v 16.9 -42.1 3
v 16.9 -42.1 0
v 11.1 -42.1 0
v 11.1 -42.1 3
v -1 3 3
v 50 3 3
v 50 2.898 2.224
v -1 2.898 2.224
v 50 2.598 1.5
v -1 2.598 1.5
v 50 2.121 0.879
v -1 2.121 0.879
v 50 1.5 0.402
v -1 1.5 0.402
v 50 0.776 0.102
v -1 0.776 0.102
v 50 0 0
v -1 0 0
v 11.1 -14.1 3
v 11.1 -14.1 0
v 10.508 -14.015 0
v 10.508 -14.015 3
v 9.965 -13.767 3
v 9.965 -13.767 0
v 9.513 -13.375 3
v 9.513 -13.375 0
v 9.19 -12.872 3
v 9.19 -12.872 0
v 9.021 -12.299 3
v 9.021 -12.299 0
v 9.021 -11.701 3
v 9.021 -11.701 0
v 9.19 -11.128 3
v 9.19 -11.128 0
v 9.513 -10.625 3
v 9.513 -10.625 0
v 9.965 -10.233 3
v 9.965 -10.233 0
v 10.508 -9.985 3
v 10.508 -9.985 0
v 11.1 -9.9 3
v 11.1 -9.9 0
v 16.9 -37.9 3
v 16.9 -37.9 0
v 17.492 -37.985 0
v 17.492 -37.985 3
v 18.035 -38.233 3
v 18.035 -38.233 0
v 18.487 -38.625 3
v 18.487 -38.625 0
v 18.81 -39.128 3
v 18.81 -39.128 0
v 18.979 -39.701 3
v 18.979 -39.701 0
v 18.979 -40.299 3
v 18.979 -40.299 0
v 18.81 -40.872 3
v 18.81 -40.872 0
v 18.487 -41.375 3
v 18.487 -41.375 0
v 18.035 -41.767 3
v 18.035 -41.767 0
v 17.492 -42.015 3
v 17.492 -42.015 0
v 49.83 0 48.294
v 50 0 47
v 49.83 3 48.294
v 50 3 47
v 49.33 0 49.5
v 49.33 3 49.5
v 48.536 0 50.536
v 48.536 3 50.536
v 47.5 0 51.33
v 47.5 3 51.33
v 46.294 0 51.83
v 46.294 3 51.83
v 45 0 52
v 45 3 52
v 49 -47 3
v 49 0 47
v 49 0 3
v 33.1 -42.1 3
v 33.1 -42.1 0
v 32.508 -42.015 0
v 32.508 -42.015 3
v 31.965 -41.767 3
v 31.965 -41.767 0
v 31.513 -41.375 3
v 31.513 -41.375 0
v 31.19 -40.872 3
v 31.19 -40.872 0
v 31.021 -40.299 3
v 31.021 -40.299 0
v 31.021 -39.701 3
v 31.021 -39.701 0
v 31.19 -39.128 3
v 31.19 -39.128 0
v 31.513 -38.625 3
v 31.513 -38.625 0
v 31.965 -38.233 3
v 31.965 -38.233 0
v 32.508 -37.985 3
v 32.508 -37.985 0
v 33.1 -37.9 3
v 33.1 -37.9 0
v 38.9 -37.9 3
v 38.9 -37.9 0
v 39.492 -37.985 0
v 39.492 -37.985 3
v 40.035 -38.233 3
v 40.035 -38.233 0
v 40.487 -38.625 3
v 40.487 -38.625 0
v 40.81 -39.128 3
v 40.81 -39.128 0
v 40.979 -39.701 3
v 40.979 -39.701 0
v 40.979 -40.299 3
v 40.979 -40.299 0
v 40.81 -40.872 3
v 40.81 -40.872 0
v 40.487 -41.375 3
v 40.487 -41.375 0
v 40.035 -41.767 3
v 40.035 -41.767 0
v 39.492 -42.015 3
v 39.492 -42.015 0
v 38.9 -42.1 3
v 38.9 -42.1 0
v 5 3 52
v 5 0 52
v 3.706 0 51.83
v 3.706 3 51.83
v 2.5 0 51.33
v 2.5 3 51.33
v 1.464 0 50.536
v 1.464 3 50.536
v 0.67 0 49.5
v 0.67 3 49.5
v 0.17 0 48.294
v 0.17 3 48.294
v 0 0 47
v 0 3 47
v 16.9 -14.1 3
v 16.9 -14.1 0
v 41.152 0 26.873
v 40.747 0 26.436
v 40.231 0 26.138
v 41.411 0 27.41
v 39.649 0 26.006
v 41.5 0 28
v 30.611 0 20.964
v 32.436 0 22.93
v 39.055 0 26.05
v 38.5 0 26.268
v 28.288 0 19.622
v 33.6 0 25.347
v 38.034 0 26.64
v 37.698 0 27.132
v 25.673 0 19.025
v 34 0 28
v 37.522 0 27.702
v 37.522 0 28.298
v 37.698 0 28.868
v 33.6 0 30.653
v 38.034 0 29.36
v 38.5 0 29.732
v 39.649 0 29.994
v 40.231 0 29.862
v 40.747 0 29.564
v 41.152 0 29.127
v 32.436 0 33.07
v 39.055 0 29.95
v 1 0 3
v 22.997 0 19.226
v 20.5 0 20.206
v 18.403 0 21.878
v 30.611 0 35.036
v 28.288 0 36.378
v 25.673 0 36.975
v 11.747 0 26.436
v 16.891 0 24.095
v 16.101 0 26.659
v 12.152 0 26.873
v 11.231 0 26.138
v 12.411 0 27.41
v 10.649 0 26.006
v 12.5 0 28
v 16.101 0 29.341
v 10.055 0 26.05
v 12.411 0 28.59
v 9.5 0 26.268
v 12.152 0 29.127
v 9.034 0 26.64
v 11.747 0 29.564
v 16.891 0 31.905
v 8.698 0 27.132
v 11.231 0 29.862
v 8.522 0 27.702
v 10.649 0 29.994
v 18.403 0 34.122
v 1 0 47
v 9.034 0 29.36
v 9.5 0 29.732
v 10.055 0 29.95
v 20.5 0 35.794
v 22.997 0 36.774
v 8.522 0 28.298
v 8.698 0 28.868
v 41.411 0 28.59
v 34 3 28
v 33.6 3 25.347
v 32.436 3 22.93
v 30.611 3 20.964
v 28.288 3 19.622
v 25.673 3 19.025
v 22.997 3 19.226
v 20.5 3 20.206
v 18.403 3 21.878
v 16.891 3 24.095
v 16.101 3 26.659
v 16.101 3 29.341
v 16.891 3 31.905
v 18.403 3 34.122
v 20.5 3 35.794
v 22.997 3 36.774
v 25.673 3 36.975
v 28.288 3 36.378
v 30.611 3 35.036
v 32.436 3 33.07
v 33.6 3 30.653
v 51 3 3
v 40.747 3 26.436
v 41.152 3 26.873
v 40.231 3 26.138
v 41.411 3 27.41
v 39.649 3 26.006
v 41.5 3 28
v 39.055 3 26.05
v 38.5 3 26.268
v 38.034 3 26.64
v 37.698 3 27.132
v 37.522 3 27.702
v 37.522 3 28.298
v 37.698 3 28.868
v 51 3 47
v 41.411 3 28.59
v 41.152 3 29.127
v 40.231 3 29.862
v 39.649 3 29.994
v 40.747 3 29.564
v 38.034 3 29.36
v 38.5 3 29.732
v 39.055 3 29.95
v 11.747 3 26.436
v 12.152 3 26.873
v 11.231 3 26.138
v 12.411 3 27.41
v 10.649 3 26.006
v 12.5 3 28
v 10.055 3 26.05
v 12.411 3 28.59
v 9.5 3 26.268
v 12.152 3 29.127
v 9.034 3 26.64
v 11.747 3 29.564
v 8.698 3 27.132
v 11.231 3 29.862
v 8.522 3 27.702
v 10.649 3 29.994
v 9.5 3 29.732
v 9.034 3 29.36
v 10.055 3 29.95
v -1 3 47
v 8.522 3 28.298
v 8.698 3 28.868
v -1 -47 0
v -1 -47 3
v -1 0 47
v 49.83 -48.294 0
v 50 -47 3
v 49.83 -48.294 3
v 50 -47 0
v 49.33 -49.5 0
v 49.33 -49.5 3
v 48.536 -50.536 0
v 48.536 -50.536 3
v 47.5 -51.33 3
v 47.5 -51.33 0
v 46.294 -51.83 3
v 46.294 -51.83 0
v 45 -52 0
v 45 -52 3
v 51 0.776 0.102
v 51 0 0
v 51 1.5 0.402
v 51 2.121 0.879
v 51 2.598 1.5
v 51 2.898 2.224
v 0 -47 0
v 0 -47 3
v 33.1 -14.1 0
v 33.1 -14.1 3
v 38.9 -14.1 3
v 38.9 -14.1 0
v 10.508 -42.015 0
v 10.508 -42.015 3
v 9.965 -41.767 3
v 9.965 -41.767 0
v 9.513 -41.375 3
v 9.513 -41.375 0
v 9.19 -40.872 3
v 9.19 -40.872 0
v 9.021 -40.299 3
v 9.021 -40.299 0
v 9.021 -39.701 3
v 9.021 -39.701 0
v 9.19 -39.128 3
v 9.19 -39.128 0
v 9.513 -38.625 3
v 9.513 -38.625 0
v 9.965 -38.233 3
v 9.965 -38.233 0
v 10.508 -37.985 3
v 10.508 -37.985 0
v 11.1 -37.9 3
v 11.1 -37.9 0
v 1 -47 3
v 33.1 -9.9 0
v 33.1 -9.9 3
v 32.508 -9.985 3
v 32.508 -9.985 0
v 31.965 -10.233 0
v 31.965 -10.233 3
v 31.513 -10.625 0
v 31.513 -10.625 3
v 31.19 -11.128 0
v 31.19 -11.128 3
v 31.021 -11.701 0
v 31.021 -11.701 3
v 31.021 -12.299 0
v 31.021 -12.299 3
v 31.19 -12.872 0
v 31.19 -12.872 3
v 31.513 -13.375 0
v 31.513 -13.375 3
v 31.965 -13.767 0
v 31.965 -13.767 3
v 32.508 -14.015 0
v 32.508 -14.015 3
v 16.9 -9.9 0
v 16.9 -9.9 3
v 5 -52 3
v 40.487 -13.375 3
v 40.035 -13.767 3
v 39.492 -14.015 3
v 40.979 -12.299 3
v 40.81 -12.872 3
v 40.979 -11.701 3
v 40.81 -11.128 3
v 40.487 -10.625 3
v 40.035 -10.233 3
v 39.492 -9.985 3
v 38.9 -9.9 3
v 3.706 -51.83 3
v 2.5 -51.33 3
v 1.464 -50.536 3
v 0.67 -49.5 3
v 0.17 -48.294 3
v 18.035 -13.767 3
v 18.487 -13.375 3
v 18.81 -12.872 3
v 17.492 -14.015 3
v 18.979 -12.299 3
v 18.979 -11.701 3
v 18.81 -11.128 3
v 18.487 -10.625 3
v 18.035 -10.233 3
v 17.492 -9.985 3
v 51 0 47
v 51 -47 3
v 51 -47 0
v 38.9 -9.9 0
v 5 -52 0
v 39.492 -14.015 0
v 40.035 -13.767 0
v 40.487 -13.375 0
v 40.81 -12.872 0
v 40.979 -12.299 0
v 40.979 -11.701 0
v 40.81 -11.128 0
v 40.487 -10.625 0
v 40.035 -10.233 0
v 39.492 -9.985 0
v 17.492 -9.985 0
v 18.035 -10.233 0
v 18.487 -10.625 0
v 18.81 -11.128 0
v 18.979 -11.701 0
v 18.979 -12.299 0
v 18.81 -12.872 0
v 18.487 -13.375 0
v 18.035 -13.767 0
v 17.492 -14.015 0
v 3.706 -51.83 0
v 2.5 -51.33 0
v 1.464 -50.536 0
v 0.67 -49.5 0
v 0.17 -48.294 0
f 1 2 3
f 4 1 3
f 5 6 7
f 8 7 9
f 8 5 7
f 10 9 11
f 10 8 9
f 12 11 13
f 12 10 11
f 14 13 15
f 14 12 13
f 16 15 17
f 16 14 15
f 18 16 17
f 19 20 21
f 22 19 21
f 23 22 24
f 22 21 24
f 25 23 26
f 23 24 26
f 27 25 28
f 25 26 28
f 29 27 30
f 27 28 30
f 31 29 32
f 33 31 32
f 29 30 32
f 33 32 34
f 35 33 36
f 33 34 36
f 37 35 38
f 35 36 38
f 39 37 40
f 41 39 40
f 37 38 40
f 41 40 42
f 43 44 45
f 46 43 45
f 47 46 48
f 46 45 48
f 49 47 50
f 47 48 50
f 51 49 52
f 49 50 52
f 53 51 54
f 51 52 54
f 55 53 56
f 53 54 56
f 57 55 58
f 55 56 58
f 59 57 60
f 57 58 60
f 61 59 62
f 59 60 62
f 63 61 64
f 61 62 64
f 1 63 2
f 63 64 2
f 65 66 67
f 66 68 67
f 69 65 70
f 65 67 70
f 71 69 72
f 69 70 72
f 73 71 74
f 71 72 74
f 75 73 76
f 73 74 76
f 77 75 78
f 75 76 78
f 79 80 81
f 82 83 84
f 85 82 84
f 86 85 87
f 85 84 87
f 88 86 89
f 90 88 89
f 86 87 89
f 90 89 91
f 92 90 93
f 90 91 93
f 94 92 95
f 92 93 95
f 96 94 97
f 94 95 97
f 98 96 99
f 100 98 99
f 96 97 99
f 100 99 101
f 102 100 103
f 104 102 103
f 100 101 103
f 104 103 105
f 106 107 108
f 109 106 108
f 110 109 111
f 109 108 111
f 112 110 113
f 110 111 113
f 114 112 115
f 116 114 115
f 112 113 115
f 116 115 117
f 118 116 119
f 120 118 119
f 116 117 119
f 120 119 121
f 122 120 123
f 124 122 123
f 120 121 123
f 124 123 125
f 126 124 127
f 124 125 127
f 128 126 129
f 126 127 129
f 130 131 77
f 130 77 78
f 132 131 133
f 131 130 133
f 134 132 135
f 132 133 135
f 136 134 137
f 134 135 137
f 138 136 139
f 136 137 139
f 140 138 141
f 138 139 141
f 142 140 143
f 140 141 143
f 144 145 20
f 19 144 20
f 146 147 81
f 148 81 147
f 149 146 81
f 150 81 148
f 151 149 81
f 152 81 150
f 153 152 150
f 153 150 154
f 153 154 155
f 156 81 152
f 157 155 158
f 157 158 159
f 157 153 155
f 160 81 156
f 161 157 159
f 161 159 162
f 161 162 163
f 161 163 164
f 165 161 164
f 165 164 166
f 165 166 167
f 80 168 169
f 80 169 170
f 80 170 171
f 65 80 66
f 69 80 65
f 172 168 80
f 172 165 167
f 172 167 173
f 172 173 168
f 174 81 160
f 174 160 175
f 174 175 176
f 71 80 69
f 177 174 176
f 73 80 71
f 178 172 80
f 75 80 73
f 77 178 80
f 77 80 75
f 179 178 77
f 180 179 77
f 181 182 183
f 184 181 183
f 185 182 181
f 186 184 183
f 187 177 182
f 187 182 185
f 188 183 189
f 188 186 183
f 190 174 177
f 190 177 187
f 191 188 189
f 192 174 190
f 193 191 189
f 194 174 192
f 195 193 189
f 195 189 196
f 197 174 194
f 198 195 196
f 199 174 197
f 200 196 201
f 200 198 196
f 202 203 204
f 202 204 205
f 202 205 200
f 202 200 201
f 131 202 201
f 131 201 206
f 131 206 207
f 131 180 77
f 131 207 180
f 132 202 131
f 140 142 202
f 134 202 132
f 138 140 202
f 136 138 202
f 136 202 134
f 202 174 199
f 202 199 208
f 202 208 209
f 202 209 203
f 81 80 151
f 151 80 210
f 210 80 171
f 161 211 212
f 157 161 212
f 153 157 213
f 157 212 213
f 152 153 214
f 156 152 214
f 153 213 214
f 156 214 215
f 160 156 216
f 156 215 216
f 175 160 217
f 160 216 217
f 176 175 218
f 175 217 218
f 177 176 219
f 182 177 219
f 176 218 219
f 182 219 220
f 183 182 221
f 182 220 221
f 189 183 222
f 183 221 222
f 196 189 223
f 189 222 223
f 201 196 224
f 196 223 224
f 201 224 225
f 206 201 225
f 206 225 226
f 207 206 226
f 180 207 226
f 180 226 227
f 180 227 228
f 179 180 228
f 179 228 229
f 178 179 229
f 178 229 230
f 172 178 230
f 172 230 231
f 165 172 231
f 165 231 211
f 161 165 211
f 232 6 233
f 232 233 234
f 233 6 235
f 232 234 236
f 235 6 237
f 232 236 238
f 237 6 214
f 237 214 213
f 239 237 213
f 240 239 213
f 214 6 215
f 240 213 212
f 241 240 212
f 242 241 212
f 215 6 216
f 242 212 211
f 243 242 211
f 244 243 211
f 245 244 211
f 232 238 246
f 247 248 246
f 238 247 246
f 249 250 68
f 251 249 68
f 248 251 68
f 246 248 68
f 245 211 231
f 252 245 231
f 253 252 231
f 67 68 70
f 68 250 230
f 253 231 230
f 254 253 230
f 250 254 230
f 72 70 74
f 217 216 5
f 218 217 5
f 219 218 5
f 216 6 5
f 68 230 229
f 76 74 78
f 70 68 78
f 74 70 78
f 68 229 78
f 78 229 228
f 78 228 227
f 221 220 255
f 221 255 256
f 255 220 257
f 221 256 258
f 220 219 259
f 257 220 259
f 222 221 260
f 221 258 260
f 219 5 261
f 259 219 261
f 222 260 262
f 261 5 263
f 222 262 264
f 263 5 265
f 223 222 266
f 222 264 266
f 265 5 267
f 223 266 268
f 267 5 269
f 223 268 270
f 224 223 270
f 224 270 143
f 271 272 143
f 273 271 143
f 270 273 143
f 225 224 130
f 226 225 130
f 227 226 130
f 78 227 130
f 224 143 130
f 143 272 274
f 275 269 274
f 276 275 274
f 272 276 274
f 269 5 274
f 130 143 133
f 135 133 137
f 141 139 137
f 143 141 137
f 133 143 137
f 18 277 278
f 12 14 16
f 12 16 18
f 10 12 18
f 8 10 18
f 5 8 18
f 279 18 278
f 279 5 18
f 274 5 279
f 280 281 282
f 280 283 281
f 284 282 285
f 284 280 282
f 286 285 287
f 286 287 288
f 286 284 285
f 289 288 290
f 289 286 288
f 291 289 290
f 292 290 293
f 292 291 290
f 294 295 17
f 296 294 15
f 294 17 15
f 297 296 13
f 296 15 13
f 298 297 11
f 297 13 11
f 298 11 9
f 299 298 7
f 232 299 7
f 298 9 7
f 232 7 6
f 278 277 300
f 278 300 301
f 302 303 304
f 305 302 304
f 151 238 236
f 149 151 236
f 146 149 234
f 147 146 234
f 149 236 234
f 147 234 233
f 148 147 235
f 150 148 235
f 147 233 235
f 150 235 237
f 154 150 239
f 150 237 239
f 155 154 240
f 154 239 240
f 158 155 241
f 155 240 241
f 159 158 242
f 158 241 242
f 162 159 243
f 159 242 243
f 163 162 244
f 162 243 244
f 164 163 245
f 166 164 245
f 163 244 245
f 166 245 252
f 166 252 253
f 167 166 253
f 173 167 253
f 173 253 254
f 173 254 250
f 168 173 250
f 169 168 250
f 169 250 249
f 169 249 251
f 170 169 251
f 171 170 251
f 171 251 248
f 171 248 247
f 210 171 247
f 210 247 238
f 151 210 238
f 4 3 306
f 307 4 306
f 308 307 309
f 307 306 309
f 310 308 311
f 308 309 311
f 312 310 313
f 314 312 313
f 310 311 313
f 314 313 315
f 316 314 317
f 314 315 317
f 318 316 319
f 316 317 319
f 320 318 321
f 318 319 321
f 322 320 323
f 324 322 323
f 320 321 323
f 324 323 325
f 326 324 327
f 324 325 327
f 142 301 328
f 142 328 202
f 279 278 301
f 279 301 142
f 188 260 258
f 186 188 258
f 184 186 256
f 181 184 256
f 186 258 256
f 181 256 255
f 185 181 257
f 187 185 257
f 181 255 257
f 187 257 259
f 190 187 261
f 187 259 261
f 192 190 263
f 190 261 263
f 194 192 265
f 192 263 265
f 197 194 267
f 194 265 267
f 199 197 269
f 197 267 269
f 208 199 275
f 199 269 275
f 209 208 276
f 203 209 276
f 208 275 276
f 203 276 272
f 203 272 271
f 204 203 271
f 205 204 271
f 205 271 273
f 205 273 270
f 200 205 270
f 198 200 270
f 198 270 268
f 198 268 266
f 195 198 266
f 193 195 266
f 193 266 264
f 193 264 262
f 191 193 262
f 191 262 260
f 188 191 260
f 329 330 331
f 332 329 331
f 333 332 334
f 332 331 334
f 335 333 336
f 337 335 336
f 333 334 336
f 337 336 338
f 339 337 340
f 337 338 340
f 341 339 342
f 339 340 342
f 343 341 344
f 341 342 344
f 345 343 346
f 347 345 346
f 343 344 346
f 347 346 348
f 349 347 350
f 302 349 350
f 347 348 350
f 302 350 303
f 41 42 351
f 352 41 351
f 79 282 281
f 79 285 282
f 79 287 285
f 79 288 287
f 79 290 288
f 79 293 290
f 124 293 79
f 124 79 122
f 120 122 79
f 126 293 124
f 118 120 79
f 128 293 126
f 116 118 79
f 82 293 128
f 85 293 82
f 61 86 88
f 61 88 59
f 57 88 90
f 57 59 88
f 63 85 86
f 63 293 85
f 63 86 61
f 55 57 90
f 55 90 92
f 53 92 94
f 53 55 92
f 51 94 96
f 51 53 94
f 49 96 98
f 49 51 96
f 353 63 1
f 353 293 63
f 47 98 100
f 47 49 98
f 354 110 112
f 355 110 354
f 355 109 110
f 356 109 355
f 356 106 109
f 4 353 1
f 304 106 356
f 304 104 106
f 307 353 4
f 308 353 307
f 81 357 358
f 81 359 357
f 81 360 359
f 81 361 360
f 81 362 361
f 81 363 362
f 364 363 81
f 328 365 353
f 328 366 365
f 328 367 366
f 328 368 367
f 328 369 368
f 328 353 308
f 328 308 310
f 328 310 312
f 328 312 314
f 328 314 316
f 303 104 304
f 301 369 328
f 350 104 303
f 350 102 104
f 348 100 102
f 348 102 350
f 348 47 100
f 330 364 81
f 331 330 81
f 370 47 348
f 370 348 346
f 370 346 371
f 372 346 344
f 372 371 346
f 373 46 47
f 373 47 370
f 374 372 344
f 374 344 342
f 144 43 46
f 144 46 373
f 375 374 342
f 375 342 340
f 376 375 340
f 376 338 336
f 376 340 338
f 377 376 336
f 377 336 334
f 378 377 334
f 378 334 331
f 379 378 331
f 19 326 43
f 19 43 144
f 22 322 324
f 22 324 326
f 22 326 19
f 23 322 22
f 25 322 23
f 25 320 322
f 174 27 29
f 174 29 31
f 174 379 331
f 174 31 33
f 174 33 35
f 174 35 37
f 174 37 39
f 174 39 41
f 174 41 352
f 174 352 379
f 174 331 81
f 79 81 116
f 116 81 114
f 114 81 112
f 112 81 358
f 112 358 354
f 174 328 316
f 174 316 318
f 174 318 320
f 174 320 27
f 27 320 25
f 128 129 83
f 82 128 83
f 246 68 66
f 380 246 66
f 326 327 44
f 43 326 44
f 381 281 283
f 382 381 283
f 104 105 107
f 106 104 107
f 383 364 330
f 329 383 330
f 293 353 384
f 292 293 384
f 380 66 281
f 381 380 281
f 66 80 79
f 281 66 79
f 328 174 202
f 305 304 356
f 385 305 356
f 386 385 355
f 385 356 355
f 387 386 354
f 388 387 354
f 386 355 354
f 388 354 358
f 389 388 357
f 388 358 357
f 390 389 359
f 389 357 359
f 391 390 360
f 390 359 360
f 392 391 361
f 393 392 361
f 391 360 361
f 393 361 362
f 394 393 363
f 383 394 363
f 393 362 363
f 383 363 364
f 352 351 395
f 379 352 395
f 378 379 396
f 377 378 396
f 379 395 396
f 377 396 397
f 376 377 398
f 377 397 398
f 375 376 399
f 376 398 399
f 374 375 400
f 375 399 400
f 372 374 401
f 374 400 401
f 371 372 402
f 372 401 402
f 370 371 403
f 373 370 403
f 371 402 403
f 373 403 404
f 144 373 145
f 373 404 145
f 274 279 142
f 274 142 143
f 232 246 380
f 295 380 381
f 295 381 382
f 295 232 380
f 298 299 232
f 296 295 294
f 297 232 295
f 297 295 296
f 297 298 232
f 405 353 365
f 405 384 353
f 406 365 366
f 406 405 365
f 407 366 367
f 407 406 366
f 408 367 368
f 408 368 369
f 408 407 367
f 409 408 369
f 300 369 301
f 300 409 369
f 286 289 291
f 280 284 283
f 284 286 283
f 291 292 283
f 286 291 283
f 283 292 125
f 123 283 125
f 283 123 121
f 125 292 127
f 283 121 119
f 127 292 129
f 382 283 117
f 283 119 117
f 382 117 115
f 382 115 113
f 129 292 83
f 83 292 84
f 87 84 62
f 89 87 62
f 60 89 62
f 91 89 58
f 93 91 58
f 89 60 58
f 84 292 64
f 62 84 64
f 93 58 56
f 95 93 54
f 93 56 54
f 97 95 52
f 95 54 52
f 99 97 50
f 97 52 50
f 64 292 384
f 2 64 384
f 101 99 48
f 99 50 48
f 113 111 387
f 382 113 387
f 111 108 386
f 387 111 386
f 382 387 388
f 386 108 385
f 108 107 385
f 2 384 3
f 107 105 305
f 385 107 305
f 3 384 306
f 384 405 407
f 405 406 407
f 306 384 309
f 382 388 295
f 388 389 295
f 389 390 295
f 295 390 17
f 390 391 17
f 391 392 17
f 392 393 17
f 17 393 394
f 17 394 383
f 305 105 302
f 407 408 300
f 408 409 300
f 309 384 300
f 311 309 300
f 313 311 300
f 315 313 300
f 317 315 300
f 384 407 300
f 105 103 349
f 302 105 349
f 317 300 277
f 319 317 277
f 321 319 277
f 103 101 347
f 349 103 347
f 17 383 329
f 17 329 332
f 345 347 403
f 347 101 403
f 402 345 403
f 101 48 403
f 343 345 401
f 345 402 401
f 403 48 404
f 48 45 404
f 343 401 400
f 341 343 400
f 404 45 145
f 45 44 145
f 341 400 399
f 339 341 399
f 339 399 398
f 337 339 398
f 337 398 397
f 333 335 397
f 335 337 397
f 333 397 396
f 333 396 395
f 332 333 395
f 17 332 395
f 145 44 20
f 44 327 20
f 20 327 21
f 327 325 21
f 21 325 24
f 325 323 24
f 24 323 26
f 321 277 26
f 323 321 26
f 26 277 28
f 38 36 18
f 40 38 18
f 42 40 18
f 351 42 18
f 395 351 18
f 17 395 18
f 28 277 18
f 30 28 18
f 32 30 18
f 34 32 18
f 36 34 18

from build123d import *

# Parameters (mm, degrees)
SKETCH1_W                  = 52
SKETCH1_H                  = 55
BOSS_EXTRUDE1_DEPTH        = 50
SKETCH2_W                  = 49
SKETCH2_H                  = 52
CUT_EXTRUDE1_DEPTH         = 89.926936302
CUT_EXTRUDE2_DEPTH         = 89.926936302
CUT_EXTRUDE3_DEPTH         = 89.926936302
CUT_EXTRUDE4_DEPTH         = 89.926936302
CUT_EXTRUDE5_DEPTH         = 88.206651122
F_18_0_18_DIAMETER_HOLE1_D = 18
F_4_0_4_DIAMETER_HOLE1_D   = 4
FILLET1_R                  = 3
FILLET2_R                  = 5
BOSS_EXTRUDE2_DEPTH        = 1
BOSS_EXTRUDE3_DEPTH        = 1
BOSS_EXTRUDE4_START        = 1
BOSS_EXTRUDE4_DEPTH        = 1
BOSS_EXTRUDE5_DEPTH        = 1


with BuildPart() as part:
    # Sketch1 → Boss-Extrude1 (new body)
    with BuildSketch(Plane(origin=(50, 0, 0), x_dir=(0, 0, -1), z_dir=(1, 0, 0))):
        with Locations((-26, -24.5)):
            Rectangle(SKETCH1_W, SKETCH1_H)
    extrude(amount=-BOSS_EXTRUDE1_DEPTH)

    # Sketch2 → Cut-Extrude1 (cut, through all)
    with BuildSketch(Plane.ZY):
        with Locations((27.5, -26)):
            Rectangle(SKETCH2_W, SKETCH2_H)
    extrude(amount=-CUT_EXTRUDE1_DEPTH, mode=Mode.SUBTRACT)

    # Sketch3 → Cut-Extrude2 (cut, through all)
    with BuildSketch(Plane(origin=(0, 0, 0), x_dir=(-1, 0, 0), z_dir=(0, 0, -1))):
        with BuildLine():
            Line((-33.1, -37.9), (-38.900000611, -37.9))
            ThreePointArc((-38.900000611, -37.9), (-41.000000611, -40), (-38.900000611, -42.1))
            Line((-38.900000611, -42.1), (-33.1, -42.1))
            ThreePointArc((-33.1, -42.1), (-31, -40), (-33.1, -37.9))
        make_face()
    extrude(amount=-CUT_EXTRUDE2_DEPTH, mode=Mode.SUBTRACT)

    # Sketch4 → Cut-Extrude3 (cut, through all)
    with BuildSketch(Plane(origin=(0, 0, 0), x_dir=(-1, 0, 0), z_dir=(0, 0, -1))):
        with BuildLine():
            Line((-16.9, -14.1), (-11.1, -14.1))
            ThreePointArc((-11.1, -14.1), (-9, -12), (-11.1, -9.9))
            Line((-11.1, -9.9), (-16.9, -9.9))
            ThreePointArc((-16.9, -9.9), (-19, -12), (-16.9, -14.1))
        make_face()
    extrude(amount=-CUT_EXTRUDE3_DEPTH, mode=Mode.SUBTRACT)

    # Sketch5 → Cut-Extrude4 (cut, through all)
    with BuildSketch(Plane(origin=(0, 0, 0), x_dir=(-1, 0, 0), z_dir=(0, 0, -1))):
        with BuildLine():
            Line((-16.9, -42.1), (-11.1, -42.1))
            ThreePointArc((-11.1, -42.1), (-9, -40), (-11.1, -37.9))
            Line((-11.1, -37.9), (-16.9, -37.9))
            ThreePointArc((-16.9, -37.9), (-19, -40), (-16.9, -42.1))
        make_face()
    extrude(amount=-CUT_EXTRUDE4_DEPTH, mode=Mode.SUBTRACT)

    # Sketch6 → Cut-Extrude5 (cut, through all)
    with BuildSketch(Plane.XY.offset(3)):
        with BuildLine():
            Line((38.9, -9.9), (33.1, -9.9))
            ThreePointArc((33.1, -9.9), (31, -12), (33.1, -14.1))
            Line((33.1, -14.1), (38.9, -14.1))
            ThreePointArc((38.9, -14.1), (41, -12), (38.9, -9.9))
        make_face()
    extrude(amount=-CUT_EXTRUDE5_DEPTH, mode=Mode.SUBTRACT)

    # Ø18.0 (18) Diameter Hole1 (through all)
    with Locations(Plane(origin=(0, 0, 0), x_dir=(-1, 0, 0), z_dir=(0, -1, 0))):
        with Locations((-25, -28)):
            Hole(F_18_0_18_DIAMETER_HOLE1_D / 2)

    # Ø4.0 (4) Diameter Hole1 (through all)
    with Locations(Plane(origin=(0, 0, 0), x_dir=(-1, 0, 0), z_dir=(0, -1, 0))):
        with Locations((-10.5, -28), (-39.5, -28)):
            Hole(F_4_0_4_DIAMETER_HOLE1_D / 2)

    # Fillet1
    fillet1_edges = [part.edges().sort_by_distance(p)[0] for p in [
        (25, 3, 0),
    ]]
    fillet(fillet1_edges, radius=FILLET1_R)

    # Fillet2
    fillet2_edges = [part.edges().sort_by_distance(p)[0] for p in [
        (50, -52, 1.5),
        (0, -52, 1.5),
        (0, 1.5, 52),
        (50, 1.5, 52),
    ]]
    fillet(fillet2_edges, radius=FILLET2_R)

    # Sketch12 → Boss-Extrude2 (add)
    with BuildSketch(Plane.ZY):
        Polygon((3, -47), (47, 0), (3, 0), align=None)
    extrude(amount=-BOSS_EXTRUDE2_DEPTH)

    # Sketch13 → Boss-Extrude3 (add)
    with BuildSketch(Plane(origin=(50, 0, 0), x_dir=(0, 0, -1), z_dir=(1, 0, 0))):
        Polygon((-3, -47), (-3, 0), (-47, 0), align=None)
    extrude(amount=-BOSS_EXTRUDE3_DEPTH)

    # Sketch14 → Boss-Extrude4 (add)
    with BuildSketch(Plane.ZY.offset(BOSS_EXTRUDE4_START)):
        with BuildLine():
            Line((0, 0), (0, -47))
            Line((0, -47), (3, -47))
            Line((3, -47), (47, 0))
            Line((47, 0), (47, 3))
            Line((47, 3), (3, 3))
            ThreePointArc((3, 3), (0.878679656, 2.121320344), (0, 0))
        make_face()
    extrude(amount=-BOSS_EXTRUDE4_DEPTH)

    # Sketch15 → Boss-Extrude5 (add)
    with BuildSketch(Plane(origin=(50, 0, 0), x_dir=(0, 0, -1), z_dir=(1, 0, 0))):
        with BuildLine():
            Line((-3, 3), (-47, 3))
            Line((-47, 3), (-47, 0))
            Line((-47, 0), (-3, -47))
            Line((-3, -47), (0, -47))
            Line((0, -47), (0, 0))
            ThreePointArc((0, 0), (-0.878679656, 2.121320344), (-3, 3))
        make_face()
    extrude(amount=BOSS_EXTRUDE5_DEPTH)


solid = part.part
